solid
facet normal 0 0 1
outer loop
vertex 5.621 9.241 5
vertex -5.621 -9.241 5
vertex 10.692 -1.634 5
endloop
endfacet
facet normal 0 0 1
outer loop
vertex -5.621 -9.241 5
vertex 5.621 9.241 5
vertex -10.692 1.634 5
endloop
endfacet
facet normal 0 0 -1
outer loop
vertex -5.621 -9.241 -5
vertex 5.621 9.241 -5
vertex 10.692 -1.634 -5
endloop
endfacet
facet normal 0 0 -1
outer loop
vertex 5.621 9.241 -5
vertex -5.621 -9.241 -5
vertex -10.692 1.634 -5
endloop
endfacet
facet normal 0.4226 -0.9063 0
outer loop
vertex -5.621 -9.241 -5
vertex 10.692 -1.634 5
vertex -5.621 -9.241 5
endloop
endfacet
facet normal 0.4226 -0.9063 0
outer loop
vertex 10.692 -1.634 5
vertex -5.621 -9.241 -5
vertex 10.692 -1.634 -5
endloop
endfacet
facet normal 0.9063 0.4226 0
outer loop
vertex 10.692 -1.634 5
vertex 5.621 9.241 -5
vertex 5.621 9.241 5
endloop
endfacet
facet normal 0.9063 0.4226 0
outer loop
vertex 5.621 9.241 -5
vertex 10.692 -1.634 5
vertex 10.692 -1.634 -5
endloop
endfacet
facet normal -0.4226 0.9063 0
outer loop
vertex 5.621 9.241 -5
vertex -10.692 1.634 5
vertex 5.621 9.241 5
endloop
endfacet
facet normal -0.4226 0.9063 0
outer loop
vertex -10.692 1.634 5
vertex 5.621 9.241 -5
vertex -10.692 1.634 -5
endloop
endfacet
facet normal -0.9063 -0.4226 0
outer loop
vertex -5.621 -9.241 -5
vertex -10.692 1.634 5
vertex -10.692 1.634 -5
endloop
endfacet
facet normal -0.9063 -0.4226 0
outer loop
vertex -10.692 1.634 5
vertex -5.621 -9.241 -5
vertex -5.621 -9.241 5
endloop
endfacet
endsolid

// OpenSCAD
// Auto-generated from tests/data/feature_fixtures_manifest.json
// fixture: box_z_through_hole_rotated_z25
// fixture_type: box
// description: Non-axis-aligned rotated box to baseline that rotated non-plate geometry is not mistakenly detected as box_like_solid.
// transform: rotate=[0.000000, 0.000000, 25.000000], translate=[0.000000, 0.000000, 0.000000]
$fn = 96;

box_size = [18.000000, 12.000000, 10.000000];
box_origin = [-9.000000, -6.000000, -5.000000];

module through_hole_x(center, diameter, length) {
  translate([box_origin[0] - 0.1, center[1], center[2]])
    rotate(a=90, v=[0, 1, 0]) cylinder(d=diameter, h=length, center=false);
}

module through_hole_y(center, diameter, length) {
  translate([center[0], box_origin[1] - 0.1, center[2]])
    rotate(a=90, v=[-1, 0, 0]) cylinder(d=diameter, h=length, center=false);
}

module through_hole_z(center, diameter, length) {
  translate([center[0], center[1], box_origin[2] - 0.1])
    cylinder(d=diameter, h=length, center=false);
}

translate([0.000000, 0.000000, 0.000000])
rotate([0.000000, 0.000000, 25.000000]) {
difference() {
  translate(box_origin) cube(box_size);
}
}
